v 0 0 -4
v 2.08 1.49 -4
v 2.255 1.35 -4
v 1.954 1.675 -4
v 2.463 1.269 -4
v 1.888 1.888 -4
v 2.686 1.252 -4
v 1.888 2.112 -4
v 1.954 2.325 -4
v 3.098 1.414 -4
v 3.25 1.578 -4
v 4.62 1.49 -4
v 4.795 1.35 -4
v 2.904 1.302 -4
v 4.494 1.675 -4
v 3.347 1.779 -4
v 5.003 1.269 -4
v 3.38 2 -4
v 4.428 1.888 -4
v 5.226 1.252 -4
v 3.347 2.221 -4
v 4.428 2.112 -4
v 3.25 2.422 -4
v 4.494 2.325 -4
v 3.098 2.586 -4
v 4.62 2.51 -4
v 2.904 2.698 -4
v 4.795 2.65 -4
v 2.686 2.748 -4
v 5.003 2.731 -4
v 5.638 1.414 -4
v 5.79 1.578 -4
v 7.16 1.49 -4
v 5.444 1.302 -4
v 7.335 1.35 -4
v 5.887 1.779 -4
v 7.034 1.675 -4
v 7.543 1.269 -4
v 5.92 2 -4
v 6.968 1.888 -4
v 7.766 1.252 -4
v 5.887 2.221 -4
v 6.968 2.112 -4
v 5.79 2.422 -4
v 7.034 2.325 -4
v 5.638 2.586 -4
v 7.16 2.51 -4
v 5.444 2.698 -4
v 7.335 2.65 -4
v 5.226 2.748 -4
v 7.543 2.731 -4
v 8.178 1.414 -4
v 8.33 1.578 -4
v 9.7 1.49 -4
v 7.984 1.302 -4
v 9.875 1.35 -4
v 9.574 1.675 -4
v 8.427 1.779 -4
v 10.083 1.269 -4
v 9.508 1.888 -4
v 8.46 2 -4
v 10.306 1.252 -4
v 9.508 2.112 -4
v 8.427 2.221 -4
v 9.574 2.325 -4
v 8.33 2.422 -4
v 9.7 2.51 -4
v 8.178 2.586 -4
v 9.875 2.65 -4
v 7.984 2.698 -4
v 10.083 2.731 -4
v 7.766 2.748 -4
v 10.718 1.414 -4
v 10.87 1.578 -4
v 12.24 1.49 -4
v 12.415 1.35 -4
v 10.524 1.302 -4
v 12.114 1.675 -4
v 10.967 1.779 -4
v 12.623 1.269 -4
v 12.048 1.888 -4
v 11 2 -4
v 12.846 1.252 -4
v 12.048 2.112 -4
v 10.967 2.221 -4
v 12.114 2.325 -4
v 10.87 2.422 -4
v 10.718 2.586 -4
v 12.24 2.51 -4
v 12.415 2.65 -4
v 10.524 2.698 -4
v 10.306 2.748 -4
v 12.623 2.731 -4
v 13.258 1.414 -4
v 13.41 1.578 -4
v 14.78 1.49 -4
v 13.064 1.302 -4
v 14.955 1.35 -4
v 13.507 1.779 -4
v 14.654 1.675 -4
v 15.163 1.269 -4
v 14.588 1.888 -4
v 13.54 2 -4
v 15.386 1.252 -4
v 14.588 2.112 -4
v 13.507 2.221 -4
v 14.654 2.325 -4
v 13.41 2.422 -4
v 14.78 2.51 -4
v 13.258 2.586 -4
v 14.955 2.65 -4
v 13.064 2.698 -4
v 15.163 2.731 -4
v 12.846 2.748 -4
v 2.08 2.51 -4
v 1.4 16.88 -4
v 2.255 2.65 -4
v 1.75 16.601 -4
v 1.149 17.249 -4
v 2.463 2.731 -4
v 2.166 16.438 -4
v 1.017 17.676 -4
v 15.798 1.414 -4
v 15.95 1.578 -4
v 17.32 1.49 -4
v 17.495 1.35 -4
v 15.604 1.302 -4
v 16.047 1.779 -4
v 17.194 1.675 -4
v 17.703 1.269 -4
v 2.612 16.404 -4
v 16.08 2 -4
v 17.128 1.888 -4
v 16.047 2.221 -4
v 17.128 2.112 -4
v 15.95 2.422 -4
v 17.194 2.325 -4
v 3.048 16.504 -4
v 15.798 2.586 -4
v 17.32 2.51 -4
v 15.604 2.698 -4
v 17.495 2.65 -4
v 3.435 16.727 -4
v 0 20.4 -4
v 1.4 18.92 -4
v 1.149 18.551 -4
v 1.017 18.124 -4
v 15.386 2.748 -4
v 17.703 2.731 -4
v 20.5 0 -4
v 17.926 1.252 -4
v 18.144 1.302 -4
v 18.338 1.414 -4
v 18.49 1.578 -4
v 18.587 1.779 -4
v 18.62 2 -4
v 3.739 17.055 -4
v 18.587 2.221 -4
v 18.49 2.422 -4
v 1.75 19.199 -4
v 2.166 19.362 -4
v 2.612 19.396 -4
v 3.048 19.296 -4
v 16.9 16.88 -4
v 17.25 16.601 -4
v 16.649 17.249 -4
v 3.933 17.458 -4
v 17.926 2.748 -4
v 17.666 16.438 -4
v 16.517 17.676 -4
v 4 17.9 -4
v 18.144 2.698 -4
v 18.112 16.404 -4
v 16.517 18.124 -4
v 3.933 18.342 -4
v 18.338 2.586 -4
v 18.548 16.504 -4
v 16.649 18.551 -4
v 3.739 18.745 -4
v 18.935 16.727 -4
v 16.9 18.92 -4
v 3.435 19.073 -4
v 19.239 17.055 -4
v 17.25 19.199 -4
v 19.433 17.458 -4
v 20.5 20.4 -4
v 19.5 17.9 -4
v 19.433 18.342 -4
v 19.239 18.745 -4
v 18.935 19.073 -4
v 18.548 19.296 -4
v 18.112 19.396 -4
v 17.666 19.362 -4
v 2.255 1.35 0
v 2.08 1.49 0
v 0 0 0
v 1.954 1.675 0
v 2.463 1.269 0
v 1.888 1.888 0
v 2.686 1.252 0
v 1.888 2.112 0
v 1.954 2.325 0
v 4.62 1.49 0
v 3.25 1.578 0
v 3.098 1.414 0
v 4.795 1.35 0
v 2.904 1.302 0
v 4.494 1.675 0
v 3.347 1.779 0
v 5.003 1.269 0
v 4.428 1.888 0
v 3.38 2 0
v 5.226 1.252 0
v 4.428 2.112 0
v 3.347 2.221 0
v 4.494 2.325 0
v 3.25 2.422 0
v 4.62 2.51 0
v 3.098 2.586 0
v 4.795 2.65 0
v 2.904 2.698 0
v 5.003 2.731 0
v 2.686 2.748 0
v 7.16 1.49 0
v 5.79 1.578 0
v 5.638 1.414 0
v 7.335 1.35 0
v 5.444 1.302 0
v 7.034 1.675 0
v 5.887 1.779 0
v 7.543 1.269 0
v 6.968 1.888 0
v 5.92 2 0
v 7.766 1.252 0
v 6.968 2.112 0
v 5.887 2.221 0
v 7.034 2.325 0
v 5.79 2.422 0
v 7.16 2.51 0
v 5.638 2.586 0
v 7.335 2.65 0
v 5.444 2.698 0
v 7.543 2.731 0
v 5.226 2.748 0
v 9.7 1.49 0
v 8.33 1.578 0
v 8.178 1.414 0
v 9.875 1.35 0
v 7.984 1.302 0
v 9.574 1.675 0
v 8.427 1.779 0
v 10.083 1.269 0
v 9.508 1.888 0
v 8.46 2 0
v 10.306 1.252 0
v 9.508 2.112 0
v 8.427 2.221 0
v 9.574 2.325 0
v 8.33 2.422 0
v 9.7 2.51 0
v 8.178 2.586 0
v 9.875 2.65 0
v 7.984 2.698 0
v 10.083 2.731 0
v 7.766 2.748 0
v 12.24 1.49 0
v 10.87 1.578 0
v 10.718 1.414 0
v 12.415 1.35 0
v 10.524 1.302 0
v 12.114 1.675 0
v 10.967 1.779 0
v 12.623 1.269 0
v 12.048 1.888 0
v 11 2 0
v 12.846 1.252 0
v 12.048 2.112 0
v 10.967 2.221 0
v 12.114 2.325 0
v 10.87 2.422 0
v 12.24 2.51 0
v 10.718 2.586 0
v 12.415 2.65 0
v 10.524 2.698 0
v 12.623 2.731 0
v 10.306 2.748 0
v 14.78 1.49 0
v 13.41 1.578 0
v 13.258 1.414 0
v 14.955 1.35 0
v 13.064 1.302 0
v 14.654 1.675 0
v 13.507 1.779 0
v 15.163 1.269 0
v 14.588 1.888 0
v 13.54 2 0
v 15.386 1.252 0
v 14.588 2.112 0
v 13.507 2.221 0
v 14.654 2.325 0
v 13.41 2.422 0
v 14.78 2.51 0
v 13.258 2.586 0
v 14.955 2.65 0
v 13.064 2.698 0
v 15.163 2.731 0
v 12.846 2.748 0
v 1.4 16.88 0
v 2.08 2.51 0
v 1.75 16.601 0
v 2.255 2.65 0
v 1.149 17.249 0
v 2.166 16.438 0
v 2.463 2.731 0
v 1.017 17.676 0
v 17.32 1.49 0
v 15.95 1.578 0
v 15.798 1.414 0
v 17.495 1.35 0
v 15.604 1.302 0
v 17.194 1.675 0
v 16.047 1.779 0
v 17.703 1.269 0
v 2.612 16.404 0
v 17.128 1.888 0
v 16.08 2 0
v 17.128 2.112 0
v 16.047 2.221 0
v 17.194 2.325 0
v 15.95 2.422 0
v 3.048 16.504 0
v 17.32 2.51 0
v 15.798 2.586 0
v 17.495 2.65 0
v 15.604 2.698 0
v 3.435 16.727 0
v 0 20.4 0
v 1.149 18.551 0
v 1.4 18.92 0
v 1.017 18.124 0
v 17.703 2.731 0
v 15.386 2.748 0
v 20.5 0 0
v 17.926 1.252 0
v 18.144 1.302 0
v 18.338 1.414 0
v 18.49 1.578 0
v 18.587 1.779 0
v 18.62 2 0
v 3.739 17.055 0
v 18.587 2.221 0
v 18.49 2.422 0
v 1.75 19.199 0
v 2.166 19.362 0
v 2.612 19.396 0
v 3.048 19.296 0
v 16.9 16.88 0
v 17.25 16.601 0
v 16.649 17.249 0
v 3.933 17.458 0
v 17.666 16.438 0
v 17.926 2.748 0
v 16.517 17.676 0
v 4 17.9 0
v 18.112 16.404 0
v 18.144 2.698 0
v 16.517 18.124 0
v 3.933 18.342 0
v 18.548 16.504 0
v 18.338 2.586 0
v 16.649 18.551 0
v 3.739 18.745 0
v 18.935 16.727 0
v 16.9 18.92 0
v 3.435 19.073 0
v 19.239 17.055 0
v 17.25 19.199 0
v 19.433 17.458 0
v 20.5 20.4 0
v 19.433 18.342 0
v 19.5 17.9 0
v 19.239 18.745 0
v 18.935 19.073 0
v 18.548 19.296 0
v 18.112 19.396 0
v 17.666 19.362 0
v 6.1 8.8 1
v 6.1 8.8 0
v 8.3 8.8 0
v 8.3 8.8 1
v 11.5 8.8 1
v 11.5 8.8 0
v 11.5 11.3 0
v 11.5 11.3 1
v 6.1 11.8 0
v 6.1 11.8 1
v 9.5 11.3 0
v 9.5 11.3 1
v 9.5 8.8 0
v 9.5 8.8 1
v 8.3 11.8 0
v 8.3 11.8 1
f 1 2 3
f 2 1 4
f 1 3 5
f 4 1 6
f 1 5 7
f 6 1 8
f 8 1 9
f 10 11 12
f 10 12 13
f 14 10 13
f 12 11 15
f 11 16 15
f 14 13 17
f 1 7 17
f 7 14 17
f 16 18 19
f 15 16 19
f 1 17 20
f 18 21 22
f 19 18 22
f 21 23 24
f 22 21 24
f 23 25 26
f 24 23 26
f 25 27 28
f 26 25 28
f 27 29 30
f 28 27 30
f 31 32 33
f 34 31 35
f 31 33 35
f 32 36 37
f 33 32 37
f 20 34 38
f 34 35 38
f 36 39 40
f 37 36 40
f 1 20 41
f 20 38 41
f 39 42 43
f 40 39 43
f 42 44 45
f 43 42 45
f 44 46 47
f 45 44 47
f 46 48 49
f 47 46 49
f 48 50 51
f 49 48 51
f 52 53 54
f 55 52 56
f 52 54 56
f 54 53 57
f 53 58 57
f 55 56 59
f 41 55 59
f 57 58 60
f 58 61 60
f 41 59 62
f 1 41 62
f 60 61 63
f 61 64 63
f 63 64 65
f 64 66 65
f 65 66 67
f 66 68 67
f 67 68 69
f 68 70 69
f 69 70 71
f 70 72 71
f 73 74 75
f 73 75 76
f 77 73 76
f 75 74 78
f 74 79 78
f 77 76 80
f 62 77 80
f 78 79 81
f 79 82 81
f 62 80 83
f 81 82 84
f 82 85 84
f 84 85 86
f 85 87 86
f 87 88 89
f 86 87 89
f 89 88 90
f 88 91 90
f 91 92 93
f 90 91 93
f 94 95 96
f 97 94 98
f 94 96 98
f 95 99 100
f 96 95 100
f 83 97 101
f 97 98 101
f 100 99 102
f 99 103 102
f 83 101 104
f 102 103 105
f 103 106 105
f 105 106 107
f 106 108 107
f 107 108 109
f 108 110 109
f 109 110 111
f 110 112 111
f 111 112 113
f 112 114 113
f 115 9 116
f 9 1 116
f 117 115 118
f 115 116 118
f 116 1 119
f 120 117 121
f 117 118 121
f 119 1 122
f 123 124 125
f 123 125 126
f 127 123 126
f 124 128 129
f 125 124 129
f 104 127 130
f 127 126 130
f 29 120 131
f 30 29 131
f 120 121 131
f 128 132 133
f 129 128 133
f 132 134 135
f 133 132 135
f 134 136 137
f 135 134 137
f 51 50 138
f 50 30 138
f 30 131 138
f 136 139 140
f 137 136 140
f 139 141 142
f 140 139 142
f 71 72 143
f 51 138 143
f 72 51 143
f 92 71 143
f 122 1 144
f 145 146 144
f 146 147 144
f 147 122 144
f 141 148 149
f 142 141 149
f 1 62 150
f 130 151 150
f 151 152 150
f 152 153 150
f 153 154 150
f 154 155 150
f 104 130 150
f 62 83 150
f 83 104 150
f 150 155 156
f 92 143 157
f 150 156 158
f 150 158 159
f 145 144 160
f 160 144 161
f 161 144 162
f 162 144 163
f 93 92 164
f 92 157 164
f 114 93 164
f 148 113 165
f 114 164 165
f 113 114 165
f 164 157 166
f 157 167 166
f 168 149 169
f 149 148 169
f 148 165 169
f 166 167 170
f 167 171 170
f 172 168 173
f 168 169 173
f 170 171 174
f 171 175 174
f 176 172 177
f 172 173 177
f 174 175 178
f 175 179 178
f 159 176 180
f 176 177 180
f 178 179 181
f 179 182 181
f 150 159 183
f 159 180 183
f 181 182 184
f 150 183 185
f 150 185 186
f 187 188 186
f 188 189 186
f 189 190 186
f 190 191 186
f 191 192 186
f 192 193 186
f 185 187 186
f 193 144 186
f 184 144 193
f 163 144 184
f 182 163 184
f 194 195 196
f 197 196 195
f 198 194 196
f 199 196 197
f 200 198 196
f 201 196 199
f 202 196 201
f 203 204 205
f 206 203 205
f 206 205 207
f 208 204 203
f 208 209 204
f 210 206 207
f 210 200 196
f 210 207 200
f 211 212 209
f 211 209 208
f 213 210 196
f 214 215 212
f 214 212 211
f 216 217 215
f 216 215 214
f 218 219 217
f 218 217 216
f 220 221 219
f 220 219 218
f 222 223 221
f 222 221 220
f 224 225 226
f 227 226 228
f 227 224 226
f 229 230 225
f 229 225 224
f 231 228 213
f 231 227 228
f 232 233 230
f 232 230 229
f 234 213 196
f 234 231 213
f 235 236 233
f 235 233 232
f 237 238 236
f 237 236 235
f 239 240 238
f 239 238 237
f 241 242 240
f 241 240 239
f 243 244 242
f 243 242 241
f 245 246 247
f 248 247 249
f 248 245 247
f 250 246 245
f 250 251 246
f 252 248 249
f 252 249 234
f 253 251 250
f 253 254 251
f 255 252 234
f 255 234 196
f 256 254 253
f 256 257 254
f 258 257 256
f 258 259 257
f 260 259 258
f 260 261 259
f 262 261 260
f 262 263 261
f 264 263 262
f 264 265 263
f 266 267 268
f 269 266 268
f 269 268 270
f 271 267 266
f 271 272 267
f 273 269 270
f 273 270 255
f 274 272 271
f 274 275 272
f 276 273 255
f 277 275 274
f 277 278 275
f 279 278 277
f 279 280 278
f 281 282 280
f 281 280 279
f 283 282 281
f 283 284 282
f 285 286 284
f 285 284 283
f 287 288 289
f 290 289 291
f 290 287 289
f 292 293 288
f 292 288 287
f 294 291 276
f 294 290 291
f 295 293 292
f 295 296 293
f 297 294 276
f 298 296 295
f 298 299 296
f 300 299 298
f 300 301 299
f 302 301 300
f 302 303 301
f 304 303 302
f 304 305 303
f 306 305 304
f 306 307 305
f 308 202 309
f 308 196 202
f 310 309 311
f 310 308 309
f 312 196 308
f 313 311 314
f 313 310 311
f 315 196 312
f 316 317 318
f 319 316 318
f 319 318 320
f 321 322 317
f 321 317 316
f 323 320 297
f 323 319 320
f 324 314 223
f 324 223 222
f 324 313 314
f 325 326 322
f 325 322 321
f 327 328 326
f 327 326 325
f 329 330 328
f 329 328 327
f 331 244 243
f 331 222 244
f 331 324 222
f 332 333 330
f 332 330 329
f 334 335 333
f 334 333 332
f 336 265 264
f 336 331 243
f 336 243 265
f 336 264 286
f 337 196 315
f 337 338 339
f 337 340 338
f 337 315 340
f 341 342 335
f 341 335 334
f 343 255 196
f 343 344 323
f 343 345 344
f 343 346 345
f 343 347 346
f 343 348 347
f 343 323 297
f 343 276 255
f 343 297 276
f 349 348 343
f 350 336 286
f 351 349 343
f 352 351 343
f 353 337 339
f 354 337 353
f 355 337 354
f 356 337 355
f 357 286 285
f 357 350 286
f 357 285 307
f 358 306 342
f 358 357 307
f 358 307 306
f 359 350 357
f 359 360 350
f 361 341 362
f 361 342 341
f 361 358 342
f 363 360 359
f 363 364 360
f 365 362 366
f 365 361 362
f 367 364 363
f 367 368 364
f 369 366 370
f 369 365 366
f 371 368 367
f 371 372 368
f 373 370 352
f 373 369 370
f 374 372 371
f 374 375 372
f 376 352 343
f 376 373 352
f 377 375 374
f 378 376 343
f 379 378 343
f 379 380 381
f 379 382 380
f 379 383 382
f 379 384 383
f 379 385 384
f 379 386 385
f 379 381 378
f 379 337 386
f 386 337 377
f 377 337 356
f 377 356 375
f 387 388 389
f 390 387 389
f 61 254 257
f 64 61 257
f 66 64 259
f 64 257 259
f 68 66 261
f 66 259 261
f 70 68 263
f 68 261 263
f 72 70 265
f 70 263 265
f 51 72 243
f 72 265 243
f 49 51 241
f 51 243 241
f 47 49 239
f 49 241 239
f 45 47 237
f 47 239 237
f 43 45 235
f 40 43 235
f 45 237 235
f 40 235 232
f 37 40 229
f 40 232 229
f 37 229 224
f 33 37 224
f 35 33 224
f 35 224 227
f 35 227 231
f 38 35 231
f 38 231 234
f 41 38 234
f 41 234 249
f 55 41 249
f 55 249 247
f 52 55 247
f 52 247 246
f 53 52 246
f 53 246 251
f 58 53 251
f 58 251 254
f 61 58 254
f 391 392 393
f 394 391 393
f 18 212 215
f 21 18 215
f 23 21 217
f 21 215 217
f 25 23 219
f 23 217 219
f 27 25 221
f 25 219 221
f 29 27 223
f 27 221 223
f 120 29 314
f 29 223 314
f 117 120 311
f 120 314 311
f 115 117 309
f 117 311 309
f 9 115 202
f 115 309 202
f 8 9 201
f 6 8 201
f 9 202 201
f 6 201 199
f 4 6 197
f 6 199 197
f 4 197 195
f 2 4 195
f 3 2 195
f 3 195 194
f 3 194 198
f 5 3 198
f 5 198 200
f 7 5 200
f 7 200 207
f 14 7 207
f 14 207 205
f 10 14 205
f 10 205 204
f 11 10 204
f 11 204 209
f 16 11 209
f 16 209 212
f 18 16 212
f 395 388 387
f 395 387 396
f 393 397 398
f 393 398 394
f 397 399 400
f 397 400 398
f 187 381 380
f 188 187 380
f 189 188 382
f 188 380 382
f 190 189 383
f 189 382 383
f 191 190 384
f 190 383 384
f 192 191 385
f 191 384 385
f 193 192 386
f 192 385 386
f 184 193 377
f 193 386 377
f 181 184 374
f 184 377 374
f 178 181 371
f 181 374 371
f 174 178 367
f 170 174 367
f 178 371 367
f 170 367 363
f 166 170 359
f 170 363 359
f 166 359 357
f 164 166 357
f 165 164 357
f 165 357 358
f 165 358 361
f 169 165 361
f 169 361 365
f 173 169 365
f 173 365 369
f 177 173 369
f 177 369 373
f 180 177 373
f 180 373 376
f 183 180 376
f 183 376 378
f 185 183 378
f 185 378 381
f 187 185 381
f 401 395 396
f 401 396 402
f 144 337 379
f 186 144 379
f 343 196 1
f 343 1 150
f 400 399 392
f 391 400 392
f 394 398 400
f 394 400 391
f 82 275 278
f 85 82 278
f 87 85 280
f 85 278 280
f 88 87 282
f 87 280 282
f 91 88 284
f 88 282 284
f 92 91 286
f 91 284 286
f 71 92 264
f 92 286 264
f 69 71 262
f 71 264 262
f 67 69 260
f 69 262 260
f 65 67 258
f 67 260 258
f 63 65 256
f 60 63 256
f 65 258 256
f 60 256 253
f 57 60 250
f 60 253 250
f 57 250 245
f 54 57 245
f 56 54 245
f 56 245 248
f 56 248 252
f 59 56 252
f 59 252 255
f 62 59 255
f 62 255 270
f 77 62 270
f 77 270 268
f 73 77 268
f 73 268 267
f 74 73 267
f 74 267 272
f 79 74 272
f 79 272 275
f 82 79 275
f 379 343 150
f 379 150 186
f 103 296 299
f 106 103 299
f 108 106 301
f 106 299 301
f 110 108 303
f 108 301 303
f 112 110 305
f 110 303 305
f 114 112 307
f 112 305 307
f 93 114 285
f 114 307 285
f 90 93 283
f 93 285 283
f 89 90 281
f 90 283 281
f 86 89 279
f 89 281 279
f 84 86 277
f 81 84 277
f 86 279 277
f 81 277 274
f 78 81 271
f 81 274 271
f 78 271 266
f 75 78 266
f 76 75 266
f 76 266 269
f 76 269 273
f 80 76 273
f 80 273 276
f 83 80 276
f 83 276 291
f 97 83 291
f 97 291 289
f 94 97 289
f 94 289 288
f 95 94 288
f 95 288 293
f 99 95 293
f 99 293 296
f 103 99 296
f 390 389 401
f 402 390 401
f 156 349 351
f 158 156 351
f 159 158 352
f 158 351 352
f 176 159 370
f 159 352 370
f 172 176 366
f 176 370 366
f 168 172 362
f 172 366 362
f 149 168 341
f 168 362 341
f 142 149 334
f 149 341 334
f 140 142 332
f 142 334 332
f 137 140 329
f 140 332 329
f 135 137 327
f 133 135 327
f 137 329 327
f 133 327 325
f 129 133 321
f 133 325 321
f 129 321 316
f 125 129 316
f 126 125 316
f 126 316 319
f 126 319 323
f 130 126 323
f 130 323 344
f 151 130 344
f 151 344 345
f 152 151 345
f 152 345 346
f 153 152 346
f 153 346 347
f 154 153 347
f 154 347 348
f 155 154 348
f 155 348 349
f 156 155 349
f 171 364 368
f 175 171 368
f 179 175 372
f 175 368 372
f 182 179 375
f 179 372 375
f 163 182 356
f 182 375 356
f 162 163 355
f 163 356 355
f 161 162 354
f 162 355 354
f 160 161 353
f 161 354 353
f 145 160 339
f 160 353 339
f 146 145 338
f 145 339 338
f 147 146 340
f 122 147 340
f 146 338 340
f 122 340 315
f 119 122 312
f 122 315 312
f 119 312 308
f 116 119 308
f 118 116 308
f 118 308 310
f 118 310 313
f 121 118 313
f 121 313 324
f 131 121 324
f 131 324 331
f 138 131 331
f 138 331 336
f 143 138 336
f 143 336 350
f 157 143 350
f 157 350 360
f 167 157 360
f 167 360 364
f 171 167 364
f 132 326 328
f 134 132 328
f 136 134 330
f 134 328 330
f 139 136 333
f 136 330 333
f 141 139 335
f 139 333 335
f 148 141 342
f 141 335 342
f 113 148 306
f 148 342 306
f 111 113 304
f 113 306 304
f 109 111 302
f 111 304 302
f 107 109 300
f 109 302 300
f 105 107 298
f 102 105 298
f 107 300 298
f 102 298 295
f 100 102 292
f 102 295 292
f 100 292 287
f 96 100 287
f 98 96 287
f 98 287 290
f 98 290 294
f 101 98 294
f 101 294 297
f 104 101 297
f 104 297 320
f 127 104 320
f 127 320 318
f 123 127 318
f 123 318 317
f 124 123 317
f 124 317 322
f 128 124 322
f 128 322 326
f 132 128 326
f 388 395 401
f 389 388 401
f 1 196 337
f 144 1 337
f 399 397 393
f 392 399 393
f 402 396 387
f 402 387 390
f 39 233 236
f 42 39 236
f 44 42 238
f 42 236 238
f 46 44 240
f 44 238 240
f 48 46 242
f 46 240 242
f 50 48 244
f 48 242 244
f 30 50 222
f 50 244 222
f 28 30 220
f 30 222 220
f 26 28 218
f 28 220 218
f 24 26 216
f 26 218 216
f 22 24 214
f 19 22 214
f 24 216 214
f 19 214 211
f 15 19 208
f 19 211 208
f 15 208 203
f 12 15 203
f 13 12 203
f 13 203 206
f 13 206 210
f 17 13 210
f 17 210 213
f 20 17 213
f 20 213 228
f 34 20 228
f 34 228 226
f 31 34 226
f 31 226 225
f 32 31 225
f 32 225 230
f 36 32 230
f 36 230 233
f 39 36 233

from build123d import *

# Parameters (mm, degrees)
ESQUISSE2_W             = 20.5
ESQUISSE2_H             = 20.4
BOSS_EXTRU_1_DEPTH      = 4
ESQUISSE3_R             = 1.5
ESQUISSE3_R_2           = 0.75
ENL_V_MAT_EXTRU_1_DEPTH = 30.196061378
ESQUISSE4_W             = 2.2
ESQUISSE4_H             = 3
BOSS_EXTRU_2_DEPTH      = 1
ESQUISSE4_W_2           = 2
ESQUISSE4_H_2           = 2.5
BOSS_EXTRU_2_2_DEPTH    = 1


with BuildPart() as part:
    # Esquisse2 → Boss.-Extru.1 (new body)
    with BuildSketch(Plane.XY):
        with Locations((10.25, 10.2)):
            Rectangle(ESQUISSE2_W, ESQUISSE2_H)
    extrude(amount=-BOSS_EXTRU_1_DEPTH)

    # Esquisse3 → Enlèv. mat.-Extru.1 (cut, through all)
    with BuildSketch(Plane.XY):
        with Locations((2.5, 17.9)):
            Circle(ESQUISSE3_R)
        with Locations((18, 17.9)):
            Circle(ESQUISSE3_R)
        with Locations((2.63, 2)):
            Circle(ESQUISSE3_R_2)
        with Locations((5.17, 2)):
            Circle(ESQUISSE3_R_2)
        with Locations((7.71, 2)):
            Circle(ESQUISSE3_R_2)
        with Locations((10.25, 2)):
            Circle(ESQUISSE3_R_2)
        with Locations((12.79, 2)):
            Circle(ESQUISSE3_R_2)
        with Locations((15.33, 2)):
            Circle(ESQUISSE3_R_2)
        with Locations((17.87, 2)):
            Circle(ESQUISSE3_R_2)
    extrude(amount=-ENL_V_MAT_EXTRU_1_DEPTH, mode=Mode.SUBTRACT)


with BuildPart() as body_2:
    # Esquisse4 → Boss.-Extru.2 (new body)
    with BuildSketch(Plane.XY):
        with Locations((7.2, 10.3)):
            Rectangle(ESQUISSE4_W, ESQUISSE4_H)
    extrude(amount=BOSS_EXTRU_2_DEPTH)


with BuildPart() as body_3:
    # Esquisse4 → Boss.-Extru.2 2 (new body)
    with BuildSketch(Plane.XY):
        with Locations((10.5, 10.05)):
            Rectangle(ESQUISSE4_W_2, ESQUISSE4_H_2)
    extrude(amount=BOSS_EXTRU_2_2_DEPTH)


solid = Compound([part.part, body_2.part, body_3.part])
